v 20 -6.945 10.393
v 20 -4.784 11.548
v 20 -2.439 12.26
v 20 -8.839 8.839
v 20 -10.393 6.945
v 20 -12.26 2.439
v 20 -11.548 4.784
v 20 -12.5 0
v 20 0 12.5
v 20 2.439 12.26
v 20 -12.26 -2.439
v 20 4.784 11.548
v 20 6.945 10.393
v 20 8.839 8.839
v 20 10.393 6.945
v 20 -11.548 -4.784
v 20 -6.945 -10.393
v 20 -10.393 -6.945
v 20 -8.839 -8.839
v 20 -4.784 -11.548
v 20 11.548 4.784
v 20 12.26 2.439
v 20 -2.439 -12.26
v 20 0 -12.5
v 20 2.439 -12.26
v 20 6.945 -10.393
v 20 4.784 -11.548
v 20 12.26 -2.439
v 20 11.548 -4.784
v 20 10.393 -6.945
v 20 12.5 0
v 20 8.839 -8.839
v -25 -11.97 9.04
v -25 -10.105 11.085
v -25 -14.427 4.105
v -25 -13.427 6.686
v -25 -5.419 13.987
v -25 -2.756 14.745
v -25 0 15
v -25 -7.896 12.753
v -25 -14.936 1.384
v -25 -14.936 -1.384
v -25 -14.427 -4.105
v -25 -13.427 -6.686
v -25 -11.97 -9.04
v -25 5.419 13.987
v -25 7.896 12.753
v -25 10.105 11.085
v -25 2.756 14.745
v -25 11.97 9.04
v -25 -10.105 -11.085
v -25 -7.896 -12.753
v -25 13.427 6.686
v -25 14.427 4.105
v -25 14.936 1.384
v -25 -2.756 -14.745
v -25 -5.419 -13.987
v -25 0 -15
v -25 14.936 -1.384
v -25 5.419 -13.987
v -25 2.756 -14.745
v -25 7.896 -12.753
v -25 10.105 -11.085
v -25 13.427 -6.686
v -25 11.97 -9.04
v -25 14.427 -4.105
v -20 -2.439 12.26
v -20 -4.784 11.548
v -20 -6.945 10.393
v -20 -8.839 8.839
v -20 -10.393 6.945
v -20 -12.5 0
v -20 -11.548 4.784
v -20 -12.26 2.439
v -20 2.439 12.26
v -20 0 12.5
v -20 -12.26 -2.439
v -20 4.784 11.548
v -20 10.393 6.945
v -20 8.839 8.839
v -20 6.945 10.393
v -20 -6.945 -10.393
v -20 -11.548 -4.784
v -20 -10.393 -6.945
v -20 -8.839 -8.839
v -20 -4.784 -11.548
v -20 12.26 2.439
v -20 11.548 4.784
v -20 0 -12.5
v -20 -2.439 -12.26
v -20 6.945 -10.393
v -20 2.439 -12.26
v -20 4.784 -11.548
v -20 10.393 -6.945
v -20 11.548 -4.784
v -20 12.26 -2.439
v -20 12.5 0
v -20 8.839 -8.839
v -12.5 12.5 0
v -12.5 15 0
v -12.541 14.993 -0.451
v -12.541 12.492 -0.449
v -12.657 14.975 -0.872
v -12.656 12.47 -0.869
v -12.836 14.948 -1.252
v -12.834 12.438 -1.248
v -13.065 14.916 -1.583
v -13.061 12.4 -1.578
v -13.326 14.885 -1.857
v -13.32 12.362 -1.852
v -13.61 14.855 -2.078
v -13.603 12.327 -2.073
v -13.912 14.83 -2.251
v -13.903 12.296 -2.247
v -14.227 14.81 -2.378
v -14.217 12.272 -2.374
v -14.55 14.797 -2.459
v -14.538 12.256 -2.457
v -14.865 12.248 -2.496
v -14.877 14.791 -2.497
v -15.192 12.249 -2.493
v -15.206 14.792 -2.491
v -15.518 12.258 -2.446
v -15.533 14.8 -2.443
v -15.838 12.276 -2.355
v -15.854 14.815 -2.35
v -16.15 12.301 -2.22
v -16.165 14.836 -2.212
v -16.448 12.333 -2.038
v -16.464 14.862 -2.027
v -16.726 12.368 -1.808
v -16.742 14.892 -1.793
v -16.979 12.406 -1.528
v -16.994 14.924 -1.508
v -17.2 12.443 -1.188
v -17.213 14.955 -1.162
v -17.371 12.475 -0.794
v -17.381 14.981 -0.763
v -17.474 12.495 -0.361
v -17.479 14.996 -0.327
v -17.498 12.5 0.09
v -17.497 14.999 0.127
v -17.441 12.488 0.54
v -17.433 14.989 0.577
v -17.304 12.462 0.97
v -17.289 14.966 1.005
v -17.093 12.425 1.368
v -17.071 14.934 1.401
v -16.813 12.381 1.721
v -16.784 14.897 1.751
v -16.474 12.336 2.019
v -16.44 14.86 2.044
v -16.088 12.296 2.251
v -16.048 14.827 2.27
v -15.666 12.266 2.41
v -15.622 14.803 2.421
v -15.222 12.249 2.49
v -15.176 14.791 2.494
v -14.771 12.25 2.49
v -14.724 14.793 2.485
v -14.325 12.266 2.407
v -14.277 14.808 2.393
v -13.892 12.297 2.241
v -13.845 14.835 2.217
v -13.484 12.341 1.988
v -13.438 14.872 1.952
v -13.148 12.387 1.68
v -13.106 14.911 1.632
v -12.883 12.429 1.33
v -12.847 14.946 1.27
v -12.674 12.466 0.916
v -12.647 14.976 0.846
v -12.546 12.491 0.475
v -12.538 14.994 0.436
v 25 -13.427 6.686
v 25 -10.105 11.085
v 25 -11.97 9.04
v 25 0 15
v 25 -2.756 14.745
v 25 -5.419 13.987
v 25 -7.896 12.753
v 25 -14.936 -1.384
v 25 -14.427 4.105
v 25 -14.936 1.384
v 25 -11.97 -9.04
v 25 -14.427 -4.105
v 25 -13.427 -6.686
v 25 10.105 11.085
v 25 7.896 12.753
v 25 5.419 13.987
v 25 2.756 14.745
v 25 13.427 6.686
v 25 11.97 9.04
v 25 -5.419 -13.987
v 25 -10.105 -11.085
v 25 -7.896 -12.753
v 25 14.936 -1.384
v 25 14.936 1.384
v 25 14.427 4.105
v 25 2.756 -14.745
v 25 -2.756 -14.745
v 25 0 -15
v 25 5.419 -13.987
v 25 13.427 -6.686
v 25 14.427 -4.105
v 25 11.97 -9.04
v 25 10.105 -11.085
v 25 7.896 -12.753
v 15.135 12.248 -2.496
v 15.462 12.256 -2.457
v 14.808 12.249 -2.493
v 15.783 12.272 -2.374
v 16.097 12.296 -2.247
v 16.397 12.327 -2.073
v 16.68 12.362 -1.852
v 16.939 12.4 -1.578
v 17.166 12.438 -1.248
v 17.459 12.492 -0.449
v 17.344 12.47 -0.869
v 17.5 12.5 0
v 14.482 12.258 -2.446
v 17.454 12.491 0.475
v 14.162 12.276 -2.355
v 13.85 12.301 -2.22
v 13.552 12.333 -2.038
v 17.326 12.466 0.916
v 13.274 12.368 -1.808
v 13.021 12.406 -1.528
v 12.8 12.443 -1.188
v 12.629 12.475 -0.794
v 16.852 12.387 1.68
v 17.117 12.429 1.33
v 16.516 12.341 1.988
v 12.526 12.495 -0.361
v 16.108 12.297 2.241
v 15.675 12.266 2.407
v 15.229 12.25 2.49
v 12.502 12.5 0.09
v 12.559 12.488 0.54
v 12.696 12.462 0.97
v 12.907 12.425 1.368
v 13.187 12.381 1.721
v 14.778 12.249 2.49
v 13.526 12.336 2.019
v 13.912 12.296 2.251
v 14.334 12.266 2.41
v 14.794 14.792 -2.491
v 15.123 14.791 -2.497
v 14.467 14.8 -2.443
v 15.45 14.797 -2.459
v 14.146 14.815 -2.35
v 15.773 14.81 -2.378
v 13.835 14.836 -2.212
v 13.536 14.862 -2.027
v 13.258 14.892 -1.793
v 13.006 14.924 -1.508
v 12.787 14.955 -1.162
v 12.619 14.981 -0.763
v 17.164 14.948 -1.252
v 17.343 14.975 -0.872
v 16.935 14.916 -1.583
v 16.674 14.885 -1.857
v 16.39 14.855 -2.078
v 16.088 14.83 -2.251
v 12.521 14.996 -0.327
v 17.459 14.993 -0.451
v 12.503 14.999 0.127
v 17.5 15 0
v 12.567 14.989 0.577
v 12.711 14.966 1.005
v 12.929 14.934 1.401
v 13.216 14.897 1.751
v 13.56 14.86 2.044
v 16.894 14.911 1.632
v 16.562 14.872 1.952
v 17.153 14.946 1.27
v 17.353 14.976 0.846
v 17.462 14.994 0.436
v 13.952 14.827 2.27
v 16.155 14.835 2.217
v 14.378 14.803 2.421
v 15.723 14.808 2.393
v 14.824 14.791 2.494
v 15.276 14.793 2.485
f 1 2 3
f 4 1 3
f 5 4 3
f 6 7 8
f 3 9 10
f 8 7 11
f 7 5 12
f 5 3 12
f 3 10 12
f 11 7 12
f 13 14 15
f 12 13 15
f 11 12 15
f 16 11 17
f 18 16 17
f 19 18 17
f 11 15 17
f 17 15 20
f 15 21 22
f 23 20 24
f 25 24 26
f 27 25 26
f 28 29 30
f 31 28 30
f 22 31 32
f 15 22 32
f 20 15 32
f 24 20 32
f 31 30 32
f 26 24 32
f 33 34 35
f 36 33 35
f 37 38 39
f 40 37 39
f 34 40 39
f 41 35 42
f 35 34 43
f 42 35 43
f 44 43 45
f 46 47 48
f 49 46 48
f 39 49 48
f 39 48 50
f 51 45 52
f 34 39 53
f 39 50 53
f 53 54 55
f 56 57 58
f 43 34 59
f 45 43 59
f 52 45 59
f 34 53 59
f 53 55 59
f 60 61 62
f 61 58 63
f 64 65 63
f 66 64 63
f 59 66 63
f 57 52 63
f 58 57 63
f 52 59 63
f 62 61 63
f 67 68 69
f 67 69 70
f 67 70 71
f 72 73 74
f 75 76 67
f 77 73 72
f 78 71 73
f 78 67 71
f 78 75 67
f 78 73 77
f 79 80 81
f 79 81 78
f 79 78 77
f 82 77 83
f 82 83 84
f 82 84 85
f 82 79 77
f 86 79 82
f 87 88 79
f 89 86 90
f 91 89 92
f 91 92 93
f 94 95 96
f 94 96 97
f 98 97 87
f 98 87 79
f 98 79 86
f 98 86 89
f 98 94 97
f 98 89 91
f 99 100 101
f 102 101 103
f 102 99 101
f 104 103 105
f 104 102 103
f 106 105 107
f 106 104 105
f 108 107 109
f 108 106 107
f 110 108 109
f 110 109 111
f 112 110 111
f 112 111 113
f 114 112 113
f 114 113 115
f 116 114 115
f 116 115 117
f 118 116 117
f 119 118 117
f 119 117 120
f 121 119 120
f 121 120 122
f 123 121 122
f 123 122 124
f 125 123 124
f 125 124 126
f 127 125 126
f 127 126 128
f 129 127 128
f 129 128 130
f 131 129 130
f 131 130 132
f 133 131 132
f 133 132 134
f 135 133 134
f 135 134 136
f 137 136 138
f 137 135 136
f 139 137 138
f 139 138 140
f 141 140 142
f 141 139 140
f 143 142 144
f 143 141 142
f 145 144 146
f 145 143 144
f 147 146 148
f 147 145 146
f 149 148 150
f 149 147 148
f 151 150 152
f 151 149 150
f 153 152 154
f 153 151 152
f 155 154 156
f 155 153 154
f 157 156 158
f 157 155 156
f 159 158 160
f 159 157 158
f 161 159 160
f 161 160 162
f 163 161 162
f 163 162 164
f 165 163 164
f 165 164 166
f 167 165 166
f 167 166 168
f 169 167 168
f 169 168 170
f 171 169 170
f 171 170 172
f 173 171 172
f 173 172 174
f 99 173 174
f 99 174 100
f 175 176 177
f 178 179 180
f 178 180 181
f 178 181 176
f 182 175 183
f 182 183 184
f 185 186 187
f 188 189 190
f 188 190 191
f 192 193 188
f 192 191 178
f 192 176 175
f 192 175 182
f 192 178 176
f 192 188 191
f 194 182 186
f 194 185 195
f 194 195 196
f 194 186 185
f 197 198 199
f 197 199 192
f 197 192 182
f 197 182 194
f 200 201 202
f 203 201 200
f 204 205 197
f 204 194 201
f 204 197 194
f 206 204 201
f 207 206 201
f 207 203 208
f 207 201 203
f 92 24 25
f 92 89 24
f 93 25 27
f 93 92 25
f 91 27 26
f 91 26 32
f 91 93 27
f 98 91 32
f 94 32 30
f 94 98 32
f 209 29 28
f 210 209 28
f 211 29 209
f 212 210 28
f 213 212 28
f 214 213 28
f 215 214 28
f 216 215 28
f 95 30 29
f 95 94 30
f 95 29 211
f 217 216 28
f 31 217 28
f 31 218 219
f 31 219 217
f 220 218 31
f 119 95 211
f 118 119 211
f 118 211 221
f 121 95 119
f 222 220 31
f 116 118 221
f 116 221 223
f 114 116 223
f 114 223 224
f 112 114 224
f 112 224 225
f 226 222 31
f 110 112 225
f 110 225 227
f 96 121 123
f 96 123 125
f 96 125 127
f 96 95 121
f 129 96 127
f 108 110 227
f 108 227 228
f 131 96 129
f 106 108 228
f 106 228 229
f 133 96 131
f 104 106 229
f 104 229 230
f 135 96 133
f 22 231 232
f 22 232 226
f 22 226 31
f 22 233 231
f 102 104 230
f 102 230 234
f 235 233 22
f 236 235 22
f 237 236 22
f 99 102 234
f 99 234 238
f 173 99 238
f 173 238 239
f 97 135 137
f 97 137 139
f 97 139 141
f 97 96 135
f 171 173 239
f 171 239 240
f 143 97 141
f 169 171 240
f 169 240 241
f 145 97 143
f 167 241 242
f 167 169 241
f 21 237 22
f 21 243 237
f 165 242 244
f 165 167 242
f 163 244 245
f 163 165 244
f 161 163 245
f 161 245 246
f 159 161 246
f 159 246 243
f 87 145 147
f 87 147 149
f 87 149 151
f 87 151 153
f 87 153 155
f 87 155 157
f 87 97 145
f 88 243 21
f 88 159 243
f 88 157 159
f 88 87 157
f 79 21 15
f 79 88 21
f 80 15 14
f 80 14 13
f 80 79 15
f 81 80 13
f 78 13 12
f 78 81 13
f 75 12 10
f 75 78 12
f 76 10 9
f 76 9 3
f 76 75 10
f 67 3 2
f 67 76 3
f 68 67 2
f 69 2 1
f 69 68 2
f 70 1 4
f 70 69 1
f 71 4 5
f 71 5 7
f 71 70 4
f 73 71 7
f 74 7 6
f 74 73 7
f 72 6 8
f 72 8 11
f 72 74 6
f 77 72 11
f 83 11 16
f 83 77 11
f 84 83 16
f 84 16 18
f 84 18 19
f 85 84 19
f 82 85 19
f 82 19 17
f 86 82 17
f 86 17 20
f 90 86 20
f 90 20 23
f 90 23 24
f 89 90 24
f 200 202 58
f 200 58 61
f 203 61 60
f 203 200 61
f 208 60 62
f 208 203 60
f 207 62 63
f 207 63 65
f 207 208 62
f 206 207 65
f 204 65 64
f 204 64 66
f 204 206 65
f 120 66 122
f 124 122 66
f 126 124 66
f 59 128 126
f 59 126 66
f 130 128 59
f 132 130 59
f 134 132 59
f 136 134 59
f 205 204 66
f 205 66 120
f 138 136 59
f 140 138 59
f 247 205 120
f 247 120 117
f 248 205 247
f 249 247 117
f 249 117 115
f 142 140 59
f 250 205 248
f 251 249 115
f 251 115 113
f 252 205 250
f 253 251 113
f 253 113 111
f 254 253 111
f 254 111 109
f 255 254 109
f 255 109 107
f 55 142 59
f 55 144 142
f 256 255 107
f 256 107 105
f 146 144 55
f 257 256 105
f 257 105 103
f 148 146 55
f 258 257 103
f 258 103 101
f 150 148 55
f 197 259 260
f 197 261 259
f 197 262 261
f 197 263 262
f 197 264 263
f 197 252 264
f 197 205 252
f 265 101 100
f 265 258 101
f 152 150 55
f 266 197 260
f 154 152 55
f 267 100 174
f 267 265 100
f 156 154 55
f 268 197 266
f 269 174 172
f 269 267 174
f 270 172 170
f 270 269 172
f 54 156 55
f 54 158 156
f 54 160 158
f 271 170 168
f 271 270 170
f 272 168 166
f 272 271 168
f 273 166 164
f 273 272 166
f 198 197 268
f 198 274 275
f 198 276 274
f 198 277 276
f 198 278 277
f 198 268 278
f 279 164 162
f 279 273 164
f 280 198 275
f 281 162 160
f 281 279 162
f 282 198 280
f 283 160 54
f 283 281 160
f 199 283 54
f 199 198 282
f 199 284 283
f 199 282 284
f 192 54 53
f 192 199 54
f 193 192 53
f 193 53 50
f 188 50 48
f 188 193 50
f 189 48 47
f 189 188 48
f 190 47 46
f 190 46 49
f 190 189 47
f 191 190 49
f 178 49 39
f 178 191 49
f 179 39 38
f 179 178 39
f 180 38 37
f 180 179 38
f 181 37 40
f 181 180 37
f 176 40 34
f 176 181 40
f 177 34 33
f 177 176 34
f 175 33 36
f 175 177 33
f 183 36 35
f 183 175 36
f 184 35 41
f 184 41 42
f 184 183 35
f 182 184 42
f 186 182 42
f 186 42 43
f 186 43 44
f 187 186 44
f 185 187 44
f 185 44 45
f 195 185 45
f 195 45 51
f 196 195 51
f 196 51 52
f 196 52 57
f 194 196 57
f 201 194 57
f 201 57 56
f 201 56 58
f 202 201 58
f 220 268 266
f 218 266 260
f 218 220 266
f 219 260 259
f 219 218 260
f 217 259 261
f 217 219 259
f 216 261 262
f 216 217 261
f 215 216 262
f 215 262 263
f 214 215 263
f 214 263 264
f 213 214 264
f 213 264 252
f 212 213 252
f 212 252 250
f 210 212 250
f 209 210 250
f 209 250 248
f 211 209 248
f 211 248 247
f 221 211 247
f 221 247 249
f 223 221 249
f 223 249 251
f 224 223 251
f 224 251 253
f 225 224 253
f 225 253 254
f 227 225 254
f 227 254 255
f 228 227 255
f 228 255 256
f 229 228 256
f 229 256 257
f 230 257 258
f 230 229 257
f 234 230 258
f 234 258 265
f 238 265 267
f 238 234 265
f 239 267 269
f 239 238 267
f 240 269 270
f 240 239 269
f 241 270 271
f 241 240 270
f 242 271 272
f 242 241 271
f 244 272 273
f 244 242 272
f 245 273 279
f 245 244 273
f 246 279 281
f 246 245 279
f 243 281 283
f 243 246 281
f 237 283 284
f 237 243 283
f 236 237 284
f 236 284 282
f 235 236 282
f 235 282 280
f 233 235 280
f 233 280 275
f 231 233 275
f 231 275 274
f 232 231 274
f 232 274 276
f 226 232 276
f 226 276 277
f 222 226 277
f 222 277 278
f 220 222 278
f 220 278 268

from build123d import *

# Parameters (mm, degrees)
SKETCH1_R           = 15
SKETCH1_R_2         = 12.5
BOSS_EXTRUDE1_DEPTH = 25
BOSS_EXTRUDE2_START = 20
SKETCH1_2_R         = 12.5
BOSS_EXTRUDE2_DEPTH = 5
BOSS_EXTRUDE3_START = -25
SKETCH1_3_R         = 12.5
BOSS_EXTRUDE3_DEPTH = 5
SKETCH2_R           = 2.5
CUT_EXTRUDE1_DEPTH  = 33.787192622


with BuildPart() as part:
    # Sketch1 → Boss-Extrude1 (new, symmetric)
    with BuildSketch(Plane(origin=(0, 0, 0), x_dir=(0, 0, -1), z_dir=(1, 0, 0))):
        Circle(SKETCH1_R)
        Circle(SKETCH1_R_2, mode=Mode.SUBTRACT)
    extrude(amount=BOSS_EXTRUDE1_DEPTH, both=True)

    # Sketch1<2> → Boss-Extrude2 (add)
    with BuildSketch(Plane(origin=(0, 0, 0), x_dir=(0, 0, -1), z_dir=(1, 0, 0)).offset(BOSS_EXTRUDE2_START)):
        Circle(SKETCH1_2_R)
    extrude(amount=BOSS_EXTRUDE2_DEPTH)

    # Sketch1<3> → Boss-Extrude3 (add)
    with BuildSketch(Plane(origin=(0, 0, 0), x_dir=(0, 0, -1), z_dir=(1, 0, 0)).offset(BOSS_EXTRUDE3_START)):
        Circle(SKETCH1_3_R)
    extrude(amount=BOSS_EXTRUDE3_DEPTH)

    # Sketch2 → Cut-Extrude1 (cut, through all)
    with BuildSketch(Plane(origin=(0, 0, 0), x_dir=(1, 0, 0), z_dir=(0, 1, 0))):
        with Locations((-15, 0)):
            Circle(SKETCH2_R)
        with Locations((15, 0)):
            Circle(SKETCH2_R)
    extrude(amount=CUT_EXTRUDE1_DEPTH, mode=Mode.SUBTRACT)


solid = part.part
